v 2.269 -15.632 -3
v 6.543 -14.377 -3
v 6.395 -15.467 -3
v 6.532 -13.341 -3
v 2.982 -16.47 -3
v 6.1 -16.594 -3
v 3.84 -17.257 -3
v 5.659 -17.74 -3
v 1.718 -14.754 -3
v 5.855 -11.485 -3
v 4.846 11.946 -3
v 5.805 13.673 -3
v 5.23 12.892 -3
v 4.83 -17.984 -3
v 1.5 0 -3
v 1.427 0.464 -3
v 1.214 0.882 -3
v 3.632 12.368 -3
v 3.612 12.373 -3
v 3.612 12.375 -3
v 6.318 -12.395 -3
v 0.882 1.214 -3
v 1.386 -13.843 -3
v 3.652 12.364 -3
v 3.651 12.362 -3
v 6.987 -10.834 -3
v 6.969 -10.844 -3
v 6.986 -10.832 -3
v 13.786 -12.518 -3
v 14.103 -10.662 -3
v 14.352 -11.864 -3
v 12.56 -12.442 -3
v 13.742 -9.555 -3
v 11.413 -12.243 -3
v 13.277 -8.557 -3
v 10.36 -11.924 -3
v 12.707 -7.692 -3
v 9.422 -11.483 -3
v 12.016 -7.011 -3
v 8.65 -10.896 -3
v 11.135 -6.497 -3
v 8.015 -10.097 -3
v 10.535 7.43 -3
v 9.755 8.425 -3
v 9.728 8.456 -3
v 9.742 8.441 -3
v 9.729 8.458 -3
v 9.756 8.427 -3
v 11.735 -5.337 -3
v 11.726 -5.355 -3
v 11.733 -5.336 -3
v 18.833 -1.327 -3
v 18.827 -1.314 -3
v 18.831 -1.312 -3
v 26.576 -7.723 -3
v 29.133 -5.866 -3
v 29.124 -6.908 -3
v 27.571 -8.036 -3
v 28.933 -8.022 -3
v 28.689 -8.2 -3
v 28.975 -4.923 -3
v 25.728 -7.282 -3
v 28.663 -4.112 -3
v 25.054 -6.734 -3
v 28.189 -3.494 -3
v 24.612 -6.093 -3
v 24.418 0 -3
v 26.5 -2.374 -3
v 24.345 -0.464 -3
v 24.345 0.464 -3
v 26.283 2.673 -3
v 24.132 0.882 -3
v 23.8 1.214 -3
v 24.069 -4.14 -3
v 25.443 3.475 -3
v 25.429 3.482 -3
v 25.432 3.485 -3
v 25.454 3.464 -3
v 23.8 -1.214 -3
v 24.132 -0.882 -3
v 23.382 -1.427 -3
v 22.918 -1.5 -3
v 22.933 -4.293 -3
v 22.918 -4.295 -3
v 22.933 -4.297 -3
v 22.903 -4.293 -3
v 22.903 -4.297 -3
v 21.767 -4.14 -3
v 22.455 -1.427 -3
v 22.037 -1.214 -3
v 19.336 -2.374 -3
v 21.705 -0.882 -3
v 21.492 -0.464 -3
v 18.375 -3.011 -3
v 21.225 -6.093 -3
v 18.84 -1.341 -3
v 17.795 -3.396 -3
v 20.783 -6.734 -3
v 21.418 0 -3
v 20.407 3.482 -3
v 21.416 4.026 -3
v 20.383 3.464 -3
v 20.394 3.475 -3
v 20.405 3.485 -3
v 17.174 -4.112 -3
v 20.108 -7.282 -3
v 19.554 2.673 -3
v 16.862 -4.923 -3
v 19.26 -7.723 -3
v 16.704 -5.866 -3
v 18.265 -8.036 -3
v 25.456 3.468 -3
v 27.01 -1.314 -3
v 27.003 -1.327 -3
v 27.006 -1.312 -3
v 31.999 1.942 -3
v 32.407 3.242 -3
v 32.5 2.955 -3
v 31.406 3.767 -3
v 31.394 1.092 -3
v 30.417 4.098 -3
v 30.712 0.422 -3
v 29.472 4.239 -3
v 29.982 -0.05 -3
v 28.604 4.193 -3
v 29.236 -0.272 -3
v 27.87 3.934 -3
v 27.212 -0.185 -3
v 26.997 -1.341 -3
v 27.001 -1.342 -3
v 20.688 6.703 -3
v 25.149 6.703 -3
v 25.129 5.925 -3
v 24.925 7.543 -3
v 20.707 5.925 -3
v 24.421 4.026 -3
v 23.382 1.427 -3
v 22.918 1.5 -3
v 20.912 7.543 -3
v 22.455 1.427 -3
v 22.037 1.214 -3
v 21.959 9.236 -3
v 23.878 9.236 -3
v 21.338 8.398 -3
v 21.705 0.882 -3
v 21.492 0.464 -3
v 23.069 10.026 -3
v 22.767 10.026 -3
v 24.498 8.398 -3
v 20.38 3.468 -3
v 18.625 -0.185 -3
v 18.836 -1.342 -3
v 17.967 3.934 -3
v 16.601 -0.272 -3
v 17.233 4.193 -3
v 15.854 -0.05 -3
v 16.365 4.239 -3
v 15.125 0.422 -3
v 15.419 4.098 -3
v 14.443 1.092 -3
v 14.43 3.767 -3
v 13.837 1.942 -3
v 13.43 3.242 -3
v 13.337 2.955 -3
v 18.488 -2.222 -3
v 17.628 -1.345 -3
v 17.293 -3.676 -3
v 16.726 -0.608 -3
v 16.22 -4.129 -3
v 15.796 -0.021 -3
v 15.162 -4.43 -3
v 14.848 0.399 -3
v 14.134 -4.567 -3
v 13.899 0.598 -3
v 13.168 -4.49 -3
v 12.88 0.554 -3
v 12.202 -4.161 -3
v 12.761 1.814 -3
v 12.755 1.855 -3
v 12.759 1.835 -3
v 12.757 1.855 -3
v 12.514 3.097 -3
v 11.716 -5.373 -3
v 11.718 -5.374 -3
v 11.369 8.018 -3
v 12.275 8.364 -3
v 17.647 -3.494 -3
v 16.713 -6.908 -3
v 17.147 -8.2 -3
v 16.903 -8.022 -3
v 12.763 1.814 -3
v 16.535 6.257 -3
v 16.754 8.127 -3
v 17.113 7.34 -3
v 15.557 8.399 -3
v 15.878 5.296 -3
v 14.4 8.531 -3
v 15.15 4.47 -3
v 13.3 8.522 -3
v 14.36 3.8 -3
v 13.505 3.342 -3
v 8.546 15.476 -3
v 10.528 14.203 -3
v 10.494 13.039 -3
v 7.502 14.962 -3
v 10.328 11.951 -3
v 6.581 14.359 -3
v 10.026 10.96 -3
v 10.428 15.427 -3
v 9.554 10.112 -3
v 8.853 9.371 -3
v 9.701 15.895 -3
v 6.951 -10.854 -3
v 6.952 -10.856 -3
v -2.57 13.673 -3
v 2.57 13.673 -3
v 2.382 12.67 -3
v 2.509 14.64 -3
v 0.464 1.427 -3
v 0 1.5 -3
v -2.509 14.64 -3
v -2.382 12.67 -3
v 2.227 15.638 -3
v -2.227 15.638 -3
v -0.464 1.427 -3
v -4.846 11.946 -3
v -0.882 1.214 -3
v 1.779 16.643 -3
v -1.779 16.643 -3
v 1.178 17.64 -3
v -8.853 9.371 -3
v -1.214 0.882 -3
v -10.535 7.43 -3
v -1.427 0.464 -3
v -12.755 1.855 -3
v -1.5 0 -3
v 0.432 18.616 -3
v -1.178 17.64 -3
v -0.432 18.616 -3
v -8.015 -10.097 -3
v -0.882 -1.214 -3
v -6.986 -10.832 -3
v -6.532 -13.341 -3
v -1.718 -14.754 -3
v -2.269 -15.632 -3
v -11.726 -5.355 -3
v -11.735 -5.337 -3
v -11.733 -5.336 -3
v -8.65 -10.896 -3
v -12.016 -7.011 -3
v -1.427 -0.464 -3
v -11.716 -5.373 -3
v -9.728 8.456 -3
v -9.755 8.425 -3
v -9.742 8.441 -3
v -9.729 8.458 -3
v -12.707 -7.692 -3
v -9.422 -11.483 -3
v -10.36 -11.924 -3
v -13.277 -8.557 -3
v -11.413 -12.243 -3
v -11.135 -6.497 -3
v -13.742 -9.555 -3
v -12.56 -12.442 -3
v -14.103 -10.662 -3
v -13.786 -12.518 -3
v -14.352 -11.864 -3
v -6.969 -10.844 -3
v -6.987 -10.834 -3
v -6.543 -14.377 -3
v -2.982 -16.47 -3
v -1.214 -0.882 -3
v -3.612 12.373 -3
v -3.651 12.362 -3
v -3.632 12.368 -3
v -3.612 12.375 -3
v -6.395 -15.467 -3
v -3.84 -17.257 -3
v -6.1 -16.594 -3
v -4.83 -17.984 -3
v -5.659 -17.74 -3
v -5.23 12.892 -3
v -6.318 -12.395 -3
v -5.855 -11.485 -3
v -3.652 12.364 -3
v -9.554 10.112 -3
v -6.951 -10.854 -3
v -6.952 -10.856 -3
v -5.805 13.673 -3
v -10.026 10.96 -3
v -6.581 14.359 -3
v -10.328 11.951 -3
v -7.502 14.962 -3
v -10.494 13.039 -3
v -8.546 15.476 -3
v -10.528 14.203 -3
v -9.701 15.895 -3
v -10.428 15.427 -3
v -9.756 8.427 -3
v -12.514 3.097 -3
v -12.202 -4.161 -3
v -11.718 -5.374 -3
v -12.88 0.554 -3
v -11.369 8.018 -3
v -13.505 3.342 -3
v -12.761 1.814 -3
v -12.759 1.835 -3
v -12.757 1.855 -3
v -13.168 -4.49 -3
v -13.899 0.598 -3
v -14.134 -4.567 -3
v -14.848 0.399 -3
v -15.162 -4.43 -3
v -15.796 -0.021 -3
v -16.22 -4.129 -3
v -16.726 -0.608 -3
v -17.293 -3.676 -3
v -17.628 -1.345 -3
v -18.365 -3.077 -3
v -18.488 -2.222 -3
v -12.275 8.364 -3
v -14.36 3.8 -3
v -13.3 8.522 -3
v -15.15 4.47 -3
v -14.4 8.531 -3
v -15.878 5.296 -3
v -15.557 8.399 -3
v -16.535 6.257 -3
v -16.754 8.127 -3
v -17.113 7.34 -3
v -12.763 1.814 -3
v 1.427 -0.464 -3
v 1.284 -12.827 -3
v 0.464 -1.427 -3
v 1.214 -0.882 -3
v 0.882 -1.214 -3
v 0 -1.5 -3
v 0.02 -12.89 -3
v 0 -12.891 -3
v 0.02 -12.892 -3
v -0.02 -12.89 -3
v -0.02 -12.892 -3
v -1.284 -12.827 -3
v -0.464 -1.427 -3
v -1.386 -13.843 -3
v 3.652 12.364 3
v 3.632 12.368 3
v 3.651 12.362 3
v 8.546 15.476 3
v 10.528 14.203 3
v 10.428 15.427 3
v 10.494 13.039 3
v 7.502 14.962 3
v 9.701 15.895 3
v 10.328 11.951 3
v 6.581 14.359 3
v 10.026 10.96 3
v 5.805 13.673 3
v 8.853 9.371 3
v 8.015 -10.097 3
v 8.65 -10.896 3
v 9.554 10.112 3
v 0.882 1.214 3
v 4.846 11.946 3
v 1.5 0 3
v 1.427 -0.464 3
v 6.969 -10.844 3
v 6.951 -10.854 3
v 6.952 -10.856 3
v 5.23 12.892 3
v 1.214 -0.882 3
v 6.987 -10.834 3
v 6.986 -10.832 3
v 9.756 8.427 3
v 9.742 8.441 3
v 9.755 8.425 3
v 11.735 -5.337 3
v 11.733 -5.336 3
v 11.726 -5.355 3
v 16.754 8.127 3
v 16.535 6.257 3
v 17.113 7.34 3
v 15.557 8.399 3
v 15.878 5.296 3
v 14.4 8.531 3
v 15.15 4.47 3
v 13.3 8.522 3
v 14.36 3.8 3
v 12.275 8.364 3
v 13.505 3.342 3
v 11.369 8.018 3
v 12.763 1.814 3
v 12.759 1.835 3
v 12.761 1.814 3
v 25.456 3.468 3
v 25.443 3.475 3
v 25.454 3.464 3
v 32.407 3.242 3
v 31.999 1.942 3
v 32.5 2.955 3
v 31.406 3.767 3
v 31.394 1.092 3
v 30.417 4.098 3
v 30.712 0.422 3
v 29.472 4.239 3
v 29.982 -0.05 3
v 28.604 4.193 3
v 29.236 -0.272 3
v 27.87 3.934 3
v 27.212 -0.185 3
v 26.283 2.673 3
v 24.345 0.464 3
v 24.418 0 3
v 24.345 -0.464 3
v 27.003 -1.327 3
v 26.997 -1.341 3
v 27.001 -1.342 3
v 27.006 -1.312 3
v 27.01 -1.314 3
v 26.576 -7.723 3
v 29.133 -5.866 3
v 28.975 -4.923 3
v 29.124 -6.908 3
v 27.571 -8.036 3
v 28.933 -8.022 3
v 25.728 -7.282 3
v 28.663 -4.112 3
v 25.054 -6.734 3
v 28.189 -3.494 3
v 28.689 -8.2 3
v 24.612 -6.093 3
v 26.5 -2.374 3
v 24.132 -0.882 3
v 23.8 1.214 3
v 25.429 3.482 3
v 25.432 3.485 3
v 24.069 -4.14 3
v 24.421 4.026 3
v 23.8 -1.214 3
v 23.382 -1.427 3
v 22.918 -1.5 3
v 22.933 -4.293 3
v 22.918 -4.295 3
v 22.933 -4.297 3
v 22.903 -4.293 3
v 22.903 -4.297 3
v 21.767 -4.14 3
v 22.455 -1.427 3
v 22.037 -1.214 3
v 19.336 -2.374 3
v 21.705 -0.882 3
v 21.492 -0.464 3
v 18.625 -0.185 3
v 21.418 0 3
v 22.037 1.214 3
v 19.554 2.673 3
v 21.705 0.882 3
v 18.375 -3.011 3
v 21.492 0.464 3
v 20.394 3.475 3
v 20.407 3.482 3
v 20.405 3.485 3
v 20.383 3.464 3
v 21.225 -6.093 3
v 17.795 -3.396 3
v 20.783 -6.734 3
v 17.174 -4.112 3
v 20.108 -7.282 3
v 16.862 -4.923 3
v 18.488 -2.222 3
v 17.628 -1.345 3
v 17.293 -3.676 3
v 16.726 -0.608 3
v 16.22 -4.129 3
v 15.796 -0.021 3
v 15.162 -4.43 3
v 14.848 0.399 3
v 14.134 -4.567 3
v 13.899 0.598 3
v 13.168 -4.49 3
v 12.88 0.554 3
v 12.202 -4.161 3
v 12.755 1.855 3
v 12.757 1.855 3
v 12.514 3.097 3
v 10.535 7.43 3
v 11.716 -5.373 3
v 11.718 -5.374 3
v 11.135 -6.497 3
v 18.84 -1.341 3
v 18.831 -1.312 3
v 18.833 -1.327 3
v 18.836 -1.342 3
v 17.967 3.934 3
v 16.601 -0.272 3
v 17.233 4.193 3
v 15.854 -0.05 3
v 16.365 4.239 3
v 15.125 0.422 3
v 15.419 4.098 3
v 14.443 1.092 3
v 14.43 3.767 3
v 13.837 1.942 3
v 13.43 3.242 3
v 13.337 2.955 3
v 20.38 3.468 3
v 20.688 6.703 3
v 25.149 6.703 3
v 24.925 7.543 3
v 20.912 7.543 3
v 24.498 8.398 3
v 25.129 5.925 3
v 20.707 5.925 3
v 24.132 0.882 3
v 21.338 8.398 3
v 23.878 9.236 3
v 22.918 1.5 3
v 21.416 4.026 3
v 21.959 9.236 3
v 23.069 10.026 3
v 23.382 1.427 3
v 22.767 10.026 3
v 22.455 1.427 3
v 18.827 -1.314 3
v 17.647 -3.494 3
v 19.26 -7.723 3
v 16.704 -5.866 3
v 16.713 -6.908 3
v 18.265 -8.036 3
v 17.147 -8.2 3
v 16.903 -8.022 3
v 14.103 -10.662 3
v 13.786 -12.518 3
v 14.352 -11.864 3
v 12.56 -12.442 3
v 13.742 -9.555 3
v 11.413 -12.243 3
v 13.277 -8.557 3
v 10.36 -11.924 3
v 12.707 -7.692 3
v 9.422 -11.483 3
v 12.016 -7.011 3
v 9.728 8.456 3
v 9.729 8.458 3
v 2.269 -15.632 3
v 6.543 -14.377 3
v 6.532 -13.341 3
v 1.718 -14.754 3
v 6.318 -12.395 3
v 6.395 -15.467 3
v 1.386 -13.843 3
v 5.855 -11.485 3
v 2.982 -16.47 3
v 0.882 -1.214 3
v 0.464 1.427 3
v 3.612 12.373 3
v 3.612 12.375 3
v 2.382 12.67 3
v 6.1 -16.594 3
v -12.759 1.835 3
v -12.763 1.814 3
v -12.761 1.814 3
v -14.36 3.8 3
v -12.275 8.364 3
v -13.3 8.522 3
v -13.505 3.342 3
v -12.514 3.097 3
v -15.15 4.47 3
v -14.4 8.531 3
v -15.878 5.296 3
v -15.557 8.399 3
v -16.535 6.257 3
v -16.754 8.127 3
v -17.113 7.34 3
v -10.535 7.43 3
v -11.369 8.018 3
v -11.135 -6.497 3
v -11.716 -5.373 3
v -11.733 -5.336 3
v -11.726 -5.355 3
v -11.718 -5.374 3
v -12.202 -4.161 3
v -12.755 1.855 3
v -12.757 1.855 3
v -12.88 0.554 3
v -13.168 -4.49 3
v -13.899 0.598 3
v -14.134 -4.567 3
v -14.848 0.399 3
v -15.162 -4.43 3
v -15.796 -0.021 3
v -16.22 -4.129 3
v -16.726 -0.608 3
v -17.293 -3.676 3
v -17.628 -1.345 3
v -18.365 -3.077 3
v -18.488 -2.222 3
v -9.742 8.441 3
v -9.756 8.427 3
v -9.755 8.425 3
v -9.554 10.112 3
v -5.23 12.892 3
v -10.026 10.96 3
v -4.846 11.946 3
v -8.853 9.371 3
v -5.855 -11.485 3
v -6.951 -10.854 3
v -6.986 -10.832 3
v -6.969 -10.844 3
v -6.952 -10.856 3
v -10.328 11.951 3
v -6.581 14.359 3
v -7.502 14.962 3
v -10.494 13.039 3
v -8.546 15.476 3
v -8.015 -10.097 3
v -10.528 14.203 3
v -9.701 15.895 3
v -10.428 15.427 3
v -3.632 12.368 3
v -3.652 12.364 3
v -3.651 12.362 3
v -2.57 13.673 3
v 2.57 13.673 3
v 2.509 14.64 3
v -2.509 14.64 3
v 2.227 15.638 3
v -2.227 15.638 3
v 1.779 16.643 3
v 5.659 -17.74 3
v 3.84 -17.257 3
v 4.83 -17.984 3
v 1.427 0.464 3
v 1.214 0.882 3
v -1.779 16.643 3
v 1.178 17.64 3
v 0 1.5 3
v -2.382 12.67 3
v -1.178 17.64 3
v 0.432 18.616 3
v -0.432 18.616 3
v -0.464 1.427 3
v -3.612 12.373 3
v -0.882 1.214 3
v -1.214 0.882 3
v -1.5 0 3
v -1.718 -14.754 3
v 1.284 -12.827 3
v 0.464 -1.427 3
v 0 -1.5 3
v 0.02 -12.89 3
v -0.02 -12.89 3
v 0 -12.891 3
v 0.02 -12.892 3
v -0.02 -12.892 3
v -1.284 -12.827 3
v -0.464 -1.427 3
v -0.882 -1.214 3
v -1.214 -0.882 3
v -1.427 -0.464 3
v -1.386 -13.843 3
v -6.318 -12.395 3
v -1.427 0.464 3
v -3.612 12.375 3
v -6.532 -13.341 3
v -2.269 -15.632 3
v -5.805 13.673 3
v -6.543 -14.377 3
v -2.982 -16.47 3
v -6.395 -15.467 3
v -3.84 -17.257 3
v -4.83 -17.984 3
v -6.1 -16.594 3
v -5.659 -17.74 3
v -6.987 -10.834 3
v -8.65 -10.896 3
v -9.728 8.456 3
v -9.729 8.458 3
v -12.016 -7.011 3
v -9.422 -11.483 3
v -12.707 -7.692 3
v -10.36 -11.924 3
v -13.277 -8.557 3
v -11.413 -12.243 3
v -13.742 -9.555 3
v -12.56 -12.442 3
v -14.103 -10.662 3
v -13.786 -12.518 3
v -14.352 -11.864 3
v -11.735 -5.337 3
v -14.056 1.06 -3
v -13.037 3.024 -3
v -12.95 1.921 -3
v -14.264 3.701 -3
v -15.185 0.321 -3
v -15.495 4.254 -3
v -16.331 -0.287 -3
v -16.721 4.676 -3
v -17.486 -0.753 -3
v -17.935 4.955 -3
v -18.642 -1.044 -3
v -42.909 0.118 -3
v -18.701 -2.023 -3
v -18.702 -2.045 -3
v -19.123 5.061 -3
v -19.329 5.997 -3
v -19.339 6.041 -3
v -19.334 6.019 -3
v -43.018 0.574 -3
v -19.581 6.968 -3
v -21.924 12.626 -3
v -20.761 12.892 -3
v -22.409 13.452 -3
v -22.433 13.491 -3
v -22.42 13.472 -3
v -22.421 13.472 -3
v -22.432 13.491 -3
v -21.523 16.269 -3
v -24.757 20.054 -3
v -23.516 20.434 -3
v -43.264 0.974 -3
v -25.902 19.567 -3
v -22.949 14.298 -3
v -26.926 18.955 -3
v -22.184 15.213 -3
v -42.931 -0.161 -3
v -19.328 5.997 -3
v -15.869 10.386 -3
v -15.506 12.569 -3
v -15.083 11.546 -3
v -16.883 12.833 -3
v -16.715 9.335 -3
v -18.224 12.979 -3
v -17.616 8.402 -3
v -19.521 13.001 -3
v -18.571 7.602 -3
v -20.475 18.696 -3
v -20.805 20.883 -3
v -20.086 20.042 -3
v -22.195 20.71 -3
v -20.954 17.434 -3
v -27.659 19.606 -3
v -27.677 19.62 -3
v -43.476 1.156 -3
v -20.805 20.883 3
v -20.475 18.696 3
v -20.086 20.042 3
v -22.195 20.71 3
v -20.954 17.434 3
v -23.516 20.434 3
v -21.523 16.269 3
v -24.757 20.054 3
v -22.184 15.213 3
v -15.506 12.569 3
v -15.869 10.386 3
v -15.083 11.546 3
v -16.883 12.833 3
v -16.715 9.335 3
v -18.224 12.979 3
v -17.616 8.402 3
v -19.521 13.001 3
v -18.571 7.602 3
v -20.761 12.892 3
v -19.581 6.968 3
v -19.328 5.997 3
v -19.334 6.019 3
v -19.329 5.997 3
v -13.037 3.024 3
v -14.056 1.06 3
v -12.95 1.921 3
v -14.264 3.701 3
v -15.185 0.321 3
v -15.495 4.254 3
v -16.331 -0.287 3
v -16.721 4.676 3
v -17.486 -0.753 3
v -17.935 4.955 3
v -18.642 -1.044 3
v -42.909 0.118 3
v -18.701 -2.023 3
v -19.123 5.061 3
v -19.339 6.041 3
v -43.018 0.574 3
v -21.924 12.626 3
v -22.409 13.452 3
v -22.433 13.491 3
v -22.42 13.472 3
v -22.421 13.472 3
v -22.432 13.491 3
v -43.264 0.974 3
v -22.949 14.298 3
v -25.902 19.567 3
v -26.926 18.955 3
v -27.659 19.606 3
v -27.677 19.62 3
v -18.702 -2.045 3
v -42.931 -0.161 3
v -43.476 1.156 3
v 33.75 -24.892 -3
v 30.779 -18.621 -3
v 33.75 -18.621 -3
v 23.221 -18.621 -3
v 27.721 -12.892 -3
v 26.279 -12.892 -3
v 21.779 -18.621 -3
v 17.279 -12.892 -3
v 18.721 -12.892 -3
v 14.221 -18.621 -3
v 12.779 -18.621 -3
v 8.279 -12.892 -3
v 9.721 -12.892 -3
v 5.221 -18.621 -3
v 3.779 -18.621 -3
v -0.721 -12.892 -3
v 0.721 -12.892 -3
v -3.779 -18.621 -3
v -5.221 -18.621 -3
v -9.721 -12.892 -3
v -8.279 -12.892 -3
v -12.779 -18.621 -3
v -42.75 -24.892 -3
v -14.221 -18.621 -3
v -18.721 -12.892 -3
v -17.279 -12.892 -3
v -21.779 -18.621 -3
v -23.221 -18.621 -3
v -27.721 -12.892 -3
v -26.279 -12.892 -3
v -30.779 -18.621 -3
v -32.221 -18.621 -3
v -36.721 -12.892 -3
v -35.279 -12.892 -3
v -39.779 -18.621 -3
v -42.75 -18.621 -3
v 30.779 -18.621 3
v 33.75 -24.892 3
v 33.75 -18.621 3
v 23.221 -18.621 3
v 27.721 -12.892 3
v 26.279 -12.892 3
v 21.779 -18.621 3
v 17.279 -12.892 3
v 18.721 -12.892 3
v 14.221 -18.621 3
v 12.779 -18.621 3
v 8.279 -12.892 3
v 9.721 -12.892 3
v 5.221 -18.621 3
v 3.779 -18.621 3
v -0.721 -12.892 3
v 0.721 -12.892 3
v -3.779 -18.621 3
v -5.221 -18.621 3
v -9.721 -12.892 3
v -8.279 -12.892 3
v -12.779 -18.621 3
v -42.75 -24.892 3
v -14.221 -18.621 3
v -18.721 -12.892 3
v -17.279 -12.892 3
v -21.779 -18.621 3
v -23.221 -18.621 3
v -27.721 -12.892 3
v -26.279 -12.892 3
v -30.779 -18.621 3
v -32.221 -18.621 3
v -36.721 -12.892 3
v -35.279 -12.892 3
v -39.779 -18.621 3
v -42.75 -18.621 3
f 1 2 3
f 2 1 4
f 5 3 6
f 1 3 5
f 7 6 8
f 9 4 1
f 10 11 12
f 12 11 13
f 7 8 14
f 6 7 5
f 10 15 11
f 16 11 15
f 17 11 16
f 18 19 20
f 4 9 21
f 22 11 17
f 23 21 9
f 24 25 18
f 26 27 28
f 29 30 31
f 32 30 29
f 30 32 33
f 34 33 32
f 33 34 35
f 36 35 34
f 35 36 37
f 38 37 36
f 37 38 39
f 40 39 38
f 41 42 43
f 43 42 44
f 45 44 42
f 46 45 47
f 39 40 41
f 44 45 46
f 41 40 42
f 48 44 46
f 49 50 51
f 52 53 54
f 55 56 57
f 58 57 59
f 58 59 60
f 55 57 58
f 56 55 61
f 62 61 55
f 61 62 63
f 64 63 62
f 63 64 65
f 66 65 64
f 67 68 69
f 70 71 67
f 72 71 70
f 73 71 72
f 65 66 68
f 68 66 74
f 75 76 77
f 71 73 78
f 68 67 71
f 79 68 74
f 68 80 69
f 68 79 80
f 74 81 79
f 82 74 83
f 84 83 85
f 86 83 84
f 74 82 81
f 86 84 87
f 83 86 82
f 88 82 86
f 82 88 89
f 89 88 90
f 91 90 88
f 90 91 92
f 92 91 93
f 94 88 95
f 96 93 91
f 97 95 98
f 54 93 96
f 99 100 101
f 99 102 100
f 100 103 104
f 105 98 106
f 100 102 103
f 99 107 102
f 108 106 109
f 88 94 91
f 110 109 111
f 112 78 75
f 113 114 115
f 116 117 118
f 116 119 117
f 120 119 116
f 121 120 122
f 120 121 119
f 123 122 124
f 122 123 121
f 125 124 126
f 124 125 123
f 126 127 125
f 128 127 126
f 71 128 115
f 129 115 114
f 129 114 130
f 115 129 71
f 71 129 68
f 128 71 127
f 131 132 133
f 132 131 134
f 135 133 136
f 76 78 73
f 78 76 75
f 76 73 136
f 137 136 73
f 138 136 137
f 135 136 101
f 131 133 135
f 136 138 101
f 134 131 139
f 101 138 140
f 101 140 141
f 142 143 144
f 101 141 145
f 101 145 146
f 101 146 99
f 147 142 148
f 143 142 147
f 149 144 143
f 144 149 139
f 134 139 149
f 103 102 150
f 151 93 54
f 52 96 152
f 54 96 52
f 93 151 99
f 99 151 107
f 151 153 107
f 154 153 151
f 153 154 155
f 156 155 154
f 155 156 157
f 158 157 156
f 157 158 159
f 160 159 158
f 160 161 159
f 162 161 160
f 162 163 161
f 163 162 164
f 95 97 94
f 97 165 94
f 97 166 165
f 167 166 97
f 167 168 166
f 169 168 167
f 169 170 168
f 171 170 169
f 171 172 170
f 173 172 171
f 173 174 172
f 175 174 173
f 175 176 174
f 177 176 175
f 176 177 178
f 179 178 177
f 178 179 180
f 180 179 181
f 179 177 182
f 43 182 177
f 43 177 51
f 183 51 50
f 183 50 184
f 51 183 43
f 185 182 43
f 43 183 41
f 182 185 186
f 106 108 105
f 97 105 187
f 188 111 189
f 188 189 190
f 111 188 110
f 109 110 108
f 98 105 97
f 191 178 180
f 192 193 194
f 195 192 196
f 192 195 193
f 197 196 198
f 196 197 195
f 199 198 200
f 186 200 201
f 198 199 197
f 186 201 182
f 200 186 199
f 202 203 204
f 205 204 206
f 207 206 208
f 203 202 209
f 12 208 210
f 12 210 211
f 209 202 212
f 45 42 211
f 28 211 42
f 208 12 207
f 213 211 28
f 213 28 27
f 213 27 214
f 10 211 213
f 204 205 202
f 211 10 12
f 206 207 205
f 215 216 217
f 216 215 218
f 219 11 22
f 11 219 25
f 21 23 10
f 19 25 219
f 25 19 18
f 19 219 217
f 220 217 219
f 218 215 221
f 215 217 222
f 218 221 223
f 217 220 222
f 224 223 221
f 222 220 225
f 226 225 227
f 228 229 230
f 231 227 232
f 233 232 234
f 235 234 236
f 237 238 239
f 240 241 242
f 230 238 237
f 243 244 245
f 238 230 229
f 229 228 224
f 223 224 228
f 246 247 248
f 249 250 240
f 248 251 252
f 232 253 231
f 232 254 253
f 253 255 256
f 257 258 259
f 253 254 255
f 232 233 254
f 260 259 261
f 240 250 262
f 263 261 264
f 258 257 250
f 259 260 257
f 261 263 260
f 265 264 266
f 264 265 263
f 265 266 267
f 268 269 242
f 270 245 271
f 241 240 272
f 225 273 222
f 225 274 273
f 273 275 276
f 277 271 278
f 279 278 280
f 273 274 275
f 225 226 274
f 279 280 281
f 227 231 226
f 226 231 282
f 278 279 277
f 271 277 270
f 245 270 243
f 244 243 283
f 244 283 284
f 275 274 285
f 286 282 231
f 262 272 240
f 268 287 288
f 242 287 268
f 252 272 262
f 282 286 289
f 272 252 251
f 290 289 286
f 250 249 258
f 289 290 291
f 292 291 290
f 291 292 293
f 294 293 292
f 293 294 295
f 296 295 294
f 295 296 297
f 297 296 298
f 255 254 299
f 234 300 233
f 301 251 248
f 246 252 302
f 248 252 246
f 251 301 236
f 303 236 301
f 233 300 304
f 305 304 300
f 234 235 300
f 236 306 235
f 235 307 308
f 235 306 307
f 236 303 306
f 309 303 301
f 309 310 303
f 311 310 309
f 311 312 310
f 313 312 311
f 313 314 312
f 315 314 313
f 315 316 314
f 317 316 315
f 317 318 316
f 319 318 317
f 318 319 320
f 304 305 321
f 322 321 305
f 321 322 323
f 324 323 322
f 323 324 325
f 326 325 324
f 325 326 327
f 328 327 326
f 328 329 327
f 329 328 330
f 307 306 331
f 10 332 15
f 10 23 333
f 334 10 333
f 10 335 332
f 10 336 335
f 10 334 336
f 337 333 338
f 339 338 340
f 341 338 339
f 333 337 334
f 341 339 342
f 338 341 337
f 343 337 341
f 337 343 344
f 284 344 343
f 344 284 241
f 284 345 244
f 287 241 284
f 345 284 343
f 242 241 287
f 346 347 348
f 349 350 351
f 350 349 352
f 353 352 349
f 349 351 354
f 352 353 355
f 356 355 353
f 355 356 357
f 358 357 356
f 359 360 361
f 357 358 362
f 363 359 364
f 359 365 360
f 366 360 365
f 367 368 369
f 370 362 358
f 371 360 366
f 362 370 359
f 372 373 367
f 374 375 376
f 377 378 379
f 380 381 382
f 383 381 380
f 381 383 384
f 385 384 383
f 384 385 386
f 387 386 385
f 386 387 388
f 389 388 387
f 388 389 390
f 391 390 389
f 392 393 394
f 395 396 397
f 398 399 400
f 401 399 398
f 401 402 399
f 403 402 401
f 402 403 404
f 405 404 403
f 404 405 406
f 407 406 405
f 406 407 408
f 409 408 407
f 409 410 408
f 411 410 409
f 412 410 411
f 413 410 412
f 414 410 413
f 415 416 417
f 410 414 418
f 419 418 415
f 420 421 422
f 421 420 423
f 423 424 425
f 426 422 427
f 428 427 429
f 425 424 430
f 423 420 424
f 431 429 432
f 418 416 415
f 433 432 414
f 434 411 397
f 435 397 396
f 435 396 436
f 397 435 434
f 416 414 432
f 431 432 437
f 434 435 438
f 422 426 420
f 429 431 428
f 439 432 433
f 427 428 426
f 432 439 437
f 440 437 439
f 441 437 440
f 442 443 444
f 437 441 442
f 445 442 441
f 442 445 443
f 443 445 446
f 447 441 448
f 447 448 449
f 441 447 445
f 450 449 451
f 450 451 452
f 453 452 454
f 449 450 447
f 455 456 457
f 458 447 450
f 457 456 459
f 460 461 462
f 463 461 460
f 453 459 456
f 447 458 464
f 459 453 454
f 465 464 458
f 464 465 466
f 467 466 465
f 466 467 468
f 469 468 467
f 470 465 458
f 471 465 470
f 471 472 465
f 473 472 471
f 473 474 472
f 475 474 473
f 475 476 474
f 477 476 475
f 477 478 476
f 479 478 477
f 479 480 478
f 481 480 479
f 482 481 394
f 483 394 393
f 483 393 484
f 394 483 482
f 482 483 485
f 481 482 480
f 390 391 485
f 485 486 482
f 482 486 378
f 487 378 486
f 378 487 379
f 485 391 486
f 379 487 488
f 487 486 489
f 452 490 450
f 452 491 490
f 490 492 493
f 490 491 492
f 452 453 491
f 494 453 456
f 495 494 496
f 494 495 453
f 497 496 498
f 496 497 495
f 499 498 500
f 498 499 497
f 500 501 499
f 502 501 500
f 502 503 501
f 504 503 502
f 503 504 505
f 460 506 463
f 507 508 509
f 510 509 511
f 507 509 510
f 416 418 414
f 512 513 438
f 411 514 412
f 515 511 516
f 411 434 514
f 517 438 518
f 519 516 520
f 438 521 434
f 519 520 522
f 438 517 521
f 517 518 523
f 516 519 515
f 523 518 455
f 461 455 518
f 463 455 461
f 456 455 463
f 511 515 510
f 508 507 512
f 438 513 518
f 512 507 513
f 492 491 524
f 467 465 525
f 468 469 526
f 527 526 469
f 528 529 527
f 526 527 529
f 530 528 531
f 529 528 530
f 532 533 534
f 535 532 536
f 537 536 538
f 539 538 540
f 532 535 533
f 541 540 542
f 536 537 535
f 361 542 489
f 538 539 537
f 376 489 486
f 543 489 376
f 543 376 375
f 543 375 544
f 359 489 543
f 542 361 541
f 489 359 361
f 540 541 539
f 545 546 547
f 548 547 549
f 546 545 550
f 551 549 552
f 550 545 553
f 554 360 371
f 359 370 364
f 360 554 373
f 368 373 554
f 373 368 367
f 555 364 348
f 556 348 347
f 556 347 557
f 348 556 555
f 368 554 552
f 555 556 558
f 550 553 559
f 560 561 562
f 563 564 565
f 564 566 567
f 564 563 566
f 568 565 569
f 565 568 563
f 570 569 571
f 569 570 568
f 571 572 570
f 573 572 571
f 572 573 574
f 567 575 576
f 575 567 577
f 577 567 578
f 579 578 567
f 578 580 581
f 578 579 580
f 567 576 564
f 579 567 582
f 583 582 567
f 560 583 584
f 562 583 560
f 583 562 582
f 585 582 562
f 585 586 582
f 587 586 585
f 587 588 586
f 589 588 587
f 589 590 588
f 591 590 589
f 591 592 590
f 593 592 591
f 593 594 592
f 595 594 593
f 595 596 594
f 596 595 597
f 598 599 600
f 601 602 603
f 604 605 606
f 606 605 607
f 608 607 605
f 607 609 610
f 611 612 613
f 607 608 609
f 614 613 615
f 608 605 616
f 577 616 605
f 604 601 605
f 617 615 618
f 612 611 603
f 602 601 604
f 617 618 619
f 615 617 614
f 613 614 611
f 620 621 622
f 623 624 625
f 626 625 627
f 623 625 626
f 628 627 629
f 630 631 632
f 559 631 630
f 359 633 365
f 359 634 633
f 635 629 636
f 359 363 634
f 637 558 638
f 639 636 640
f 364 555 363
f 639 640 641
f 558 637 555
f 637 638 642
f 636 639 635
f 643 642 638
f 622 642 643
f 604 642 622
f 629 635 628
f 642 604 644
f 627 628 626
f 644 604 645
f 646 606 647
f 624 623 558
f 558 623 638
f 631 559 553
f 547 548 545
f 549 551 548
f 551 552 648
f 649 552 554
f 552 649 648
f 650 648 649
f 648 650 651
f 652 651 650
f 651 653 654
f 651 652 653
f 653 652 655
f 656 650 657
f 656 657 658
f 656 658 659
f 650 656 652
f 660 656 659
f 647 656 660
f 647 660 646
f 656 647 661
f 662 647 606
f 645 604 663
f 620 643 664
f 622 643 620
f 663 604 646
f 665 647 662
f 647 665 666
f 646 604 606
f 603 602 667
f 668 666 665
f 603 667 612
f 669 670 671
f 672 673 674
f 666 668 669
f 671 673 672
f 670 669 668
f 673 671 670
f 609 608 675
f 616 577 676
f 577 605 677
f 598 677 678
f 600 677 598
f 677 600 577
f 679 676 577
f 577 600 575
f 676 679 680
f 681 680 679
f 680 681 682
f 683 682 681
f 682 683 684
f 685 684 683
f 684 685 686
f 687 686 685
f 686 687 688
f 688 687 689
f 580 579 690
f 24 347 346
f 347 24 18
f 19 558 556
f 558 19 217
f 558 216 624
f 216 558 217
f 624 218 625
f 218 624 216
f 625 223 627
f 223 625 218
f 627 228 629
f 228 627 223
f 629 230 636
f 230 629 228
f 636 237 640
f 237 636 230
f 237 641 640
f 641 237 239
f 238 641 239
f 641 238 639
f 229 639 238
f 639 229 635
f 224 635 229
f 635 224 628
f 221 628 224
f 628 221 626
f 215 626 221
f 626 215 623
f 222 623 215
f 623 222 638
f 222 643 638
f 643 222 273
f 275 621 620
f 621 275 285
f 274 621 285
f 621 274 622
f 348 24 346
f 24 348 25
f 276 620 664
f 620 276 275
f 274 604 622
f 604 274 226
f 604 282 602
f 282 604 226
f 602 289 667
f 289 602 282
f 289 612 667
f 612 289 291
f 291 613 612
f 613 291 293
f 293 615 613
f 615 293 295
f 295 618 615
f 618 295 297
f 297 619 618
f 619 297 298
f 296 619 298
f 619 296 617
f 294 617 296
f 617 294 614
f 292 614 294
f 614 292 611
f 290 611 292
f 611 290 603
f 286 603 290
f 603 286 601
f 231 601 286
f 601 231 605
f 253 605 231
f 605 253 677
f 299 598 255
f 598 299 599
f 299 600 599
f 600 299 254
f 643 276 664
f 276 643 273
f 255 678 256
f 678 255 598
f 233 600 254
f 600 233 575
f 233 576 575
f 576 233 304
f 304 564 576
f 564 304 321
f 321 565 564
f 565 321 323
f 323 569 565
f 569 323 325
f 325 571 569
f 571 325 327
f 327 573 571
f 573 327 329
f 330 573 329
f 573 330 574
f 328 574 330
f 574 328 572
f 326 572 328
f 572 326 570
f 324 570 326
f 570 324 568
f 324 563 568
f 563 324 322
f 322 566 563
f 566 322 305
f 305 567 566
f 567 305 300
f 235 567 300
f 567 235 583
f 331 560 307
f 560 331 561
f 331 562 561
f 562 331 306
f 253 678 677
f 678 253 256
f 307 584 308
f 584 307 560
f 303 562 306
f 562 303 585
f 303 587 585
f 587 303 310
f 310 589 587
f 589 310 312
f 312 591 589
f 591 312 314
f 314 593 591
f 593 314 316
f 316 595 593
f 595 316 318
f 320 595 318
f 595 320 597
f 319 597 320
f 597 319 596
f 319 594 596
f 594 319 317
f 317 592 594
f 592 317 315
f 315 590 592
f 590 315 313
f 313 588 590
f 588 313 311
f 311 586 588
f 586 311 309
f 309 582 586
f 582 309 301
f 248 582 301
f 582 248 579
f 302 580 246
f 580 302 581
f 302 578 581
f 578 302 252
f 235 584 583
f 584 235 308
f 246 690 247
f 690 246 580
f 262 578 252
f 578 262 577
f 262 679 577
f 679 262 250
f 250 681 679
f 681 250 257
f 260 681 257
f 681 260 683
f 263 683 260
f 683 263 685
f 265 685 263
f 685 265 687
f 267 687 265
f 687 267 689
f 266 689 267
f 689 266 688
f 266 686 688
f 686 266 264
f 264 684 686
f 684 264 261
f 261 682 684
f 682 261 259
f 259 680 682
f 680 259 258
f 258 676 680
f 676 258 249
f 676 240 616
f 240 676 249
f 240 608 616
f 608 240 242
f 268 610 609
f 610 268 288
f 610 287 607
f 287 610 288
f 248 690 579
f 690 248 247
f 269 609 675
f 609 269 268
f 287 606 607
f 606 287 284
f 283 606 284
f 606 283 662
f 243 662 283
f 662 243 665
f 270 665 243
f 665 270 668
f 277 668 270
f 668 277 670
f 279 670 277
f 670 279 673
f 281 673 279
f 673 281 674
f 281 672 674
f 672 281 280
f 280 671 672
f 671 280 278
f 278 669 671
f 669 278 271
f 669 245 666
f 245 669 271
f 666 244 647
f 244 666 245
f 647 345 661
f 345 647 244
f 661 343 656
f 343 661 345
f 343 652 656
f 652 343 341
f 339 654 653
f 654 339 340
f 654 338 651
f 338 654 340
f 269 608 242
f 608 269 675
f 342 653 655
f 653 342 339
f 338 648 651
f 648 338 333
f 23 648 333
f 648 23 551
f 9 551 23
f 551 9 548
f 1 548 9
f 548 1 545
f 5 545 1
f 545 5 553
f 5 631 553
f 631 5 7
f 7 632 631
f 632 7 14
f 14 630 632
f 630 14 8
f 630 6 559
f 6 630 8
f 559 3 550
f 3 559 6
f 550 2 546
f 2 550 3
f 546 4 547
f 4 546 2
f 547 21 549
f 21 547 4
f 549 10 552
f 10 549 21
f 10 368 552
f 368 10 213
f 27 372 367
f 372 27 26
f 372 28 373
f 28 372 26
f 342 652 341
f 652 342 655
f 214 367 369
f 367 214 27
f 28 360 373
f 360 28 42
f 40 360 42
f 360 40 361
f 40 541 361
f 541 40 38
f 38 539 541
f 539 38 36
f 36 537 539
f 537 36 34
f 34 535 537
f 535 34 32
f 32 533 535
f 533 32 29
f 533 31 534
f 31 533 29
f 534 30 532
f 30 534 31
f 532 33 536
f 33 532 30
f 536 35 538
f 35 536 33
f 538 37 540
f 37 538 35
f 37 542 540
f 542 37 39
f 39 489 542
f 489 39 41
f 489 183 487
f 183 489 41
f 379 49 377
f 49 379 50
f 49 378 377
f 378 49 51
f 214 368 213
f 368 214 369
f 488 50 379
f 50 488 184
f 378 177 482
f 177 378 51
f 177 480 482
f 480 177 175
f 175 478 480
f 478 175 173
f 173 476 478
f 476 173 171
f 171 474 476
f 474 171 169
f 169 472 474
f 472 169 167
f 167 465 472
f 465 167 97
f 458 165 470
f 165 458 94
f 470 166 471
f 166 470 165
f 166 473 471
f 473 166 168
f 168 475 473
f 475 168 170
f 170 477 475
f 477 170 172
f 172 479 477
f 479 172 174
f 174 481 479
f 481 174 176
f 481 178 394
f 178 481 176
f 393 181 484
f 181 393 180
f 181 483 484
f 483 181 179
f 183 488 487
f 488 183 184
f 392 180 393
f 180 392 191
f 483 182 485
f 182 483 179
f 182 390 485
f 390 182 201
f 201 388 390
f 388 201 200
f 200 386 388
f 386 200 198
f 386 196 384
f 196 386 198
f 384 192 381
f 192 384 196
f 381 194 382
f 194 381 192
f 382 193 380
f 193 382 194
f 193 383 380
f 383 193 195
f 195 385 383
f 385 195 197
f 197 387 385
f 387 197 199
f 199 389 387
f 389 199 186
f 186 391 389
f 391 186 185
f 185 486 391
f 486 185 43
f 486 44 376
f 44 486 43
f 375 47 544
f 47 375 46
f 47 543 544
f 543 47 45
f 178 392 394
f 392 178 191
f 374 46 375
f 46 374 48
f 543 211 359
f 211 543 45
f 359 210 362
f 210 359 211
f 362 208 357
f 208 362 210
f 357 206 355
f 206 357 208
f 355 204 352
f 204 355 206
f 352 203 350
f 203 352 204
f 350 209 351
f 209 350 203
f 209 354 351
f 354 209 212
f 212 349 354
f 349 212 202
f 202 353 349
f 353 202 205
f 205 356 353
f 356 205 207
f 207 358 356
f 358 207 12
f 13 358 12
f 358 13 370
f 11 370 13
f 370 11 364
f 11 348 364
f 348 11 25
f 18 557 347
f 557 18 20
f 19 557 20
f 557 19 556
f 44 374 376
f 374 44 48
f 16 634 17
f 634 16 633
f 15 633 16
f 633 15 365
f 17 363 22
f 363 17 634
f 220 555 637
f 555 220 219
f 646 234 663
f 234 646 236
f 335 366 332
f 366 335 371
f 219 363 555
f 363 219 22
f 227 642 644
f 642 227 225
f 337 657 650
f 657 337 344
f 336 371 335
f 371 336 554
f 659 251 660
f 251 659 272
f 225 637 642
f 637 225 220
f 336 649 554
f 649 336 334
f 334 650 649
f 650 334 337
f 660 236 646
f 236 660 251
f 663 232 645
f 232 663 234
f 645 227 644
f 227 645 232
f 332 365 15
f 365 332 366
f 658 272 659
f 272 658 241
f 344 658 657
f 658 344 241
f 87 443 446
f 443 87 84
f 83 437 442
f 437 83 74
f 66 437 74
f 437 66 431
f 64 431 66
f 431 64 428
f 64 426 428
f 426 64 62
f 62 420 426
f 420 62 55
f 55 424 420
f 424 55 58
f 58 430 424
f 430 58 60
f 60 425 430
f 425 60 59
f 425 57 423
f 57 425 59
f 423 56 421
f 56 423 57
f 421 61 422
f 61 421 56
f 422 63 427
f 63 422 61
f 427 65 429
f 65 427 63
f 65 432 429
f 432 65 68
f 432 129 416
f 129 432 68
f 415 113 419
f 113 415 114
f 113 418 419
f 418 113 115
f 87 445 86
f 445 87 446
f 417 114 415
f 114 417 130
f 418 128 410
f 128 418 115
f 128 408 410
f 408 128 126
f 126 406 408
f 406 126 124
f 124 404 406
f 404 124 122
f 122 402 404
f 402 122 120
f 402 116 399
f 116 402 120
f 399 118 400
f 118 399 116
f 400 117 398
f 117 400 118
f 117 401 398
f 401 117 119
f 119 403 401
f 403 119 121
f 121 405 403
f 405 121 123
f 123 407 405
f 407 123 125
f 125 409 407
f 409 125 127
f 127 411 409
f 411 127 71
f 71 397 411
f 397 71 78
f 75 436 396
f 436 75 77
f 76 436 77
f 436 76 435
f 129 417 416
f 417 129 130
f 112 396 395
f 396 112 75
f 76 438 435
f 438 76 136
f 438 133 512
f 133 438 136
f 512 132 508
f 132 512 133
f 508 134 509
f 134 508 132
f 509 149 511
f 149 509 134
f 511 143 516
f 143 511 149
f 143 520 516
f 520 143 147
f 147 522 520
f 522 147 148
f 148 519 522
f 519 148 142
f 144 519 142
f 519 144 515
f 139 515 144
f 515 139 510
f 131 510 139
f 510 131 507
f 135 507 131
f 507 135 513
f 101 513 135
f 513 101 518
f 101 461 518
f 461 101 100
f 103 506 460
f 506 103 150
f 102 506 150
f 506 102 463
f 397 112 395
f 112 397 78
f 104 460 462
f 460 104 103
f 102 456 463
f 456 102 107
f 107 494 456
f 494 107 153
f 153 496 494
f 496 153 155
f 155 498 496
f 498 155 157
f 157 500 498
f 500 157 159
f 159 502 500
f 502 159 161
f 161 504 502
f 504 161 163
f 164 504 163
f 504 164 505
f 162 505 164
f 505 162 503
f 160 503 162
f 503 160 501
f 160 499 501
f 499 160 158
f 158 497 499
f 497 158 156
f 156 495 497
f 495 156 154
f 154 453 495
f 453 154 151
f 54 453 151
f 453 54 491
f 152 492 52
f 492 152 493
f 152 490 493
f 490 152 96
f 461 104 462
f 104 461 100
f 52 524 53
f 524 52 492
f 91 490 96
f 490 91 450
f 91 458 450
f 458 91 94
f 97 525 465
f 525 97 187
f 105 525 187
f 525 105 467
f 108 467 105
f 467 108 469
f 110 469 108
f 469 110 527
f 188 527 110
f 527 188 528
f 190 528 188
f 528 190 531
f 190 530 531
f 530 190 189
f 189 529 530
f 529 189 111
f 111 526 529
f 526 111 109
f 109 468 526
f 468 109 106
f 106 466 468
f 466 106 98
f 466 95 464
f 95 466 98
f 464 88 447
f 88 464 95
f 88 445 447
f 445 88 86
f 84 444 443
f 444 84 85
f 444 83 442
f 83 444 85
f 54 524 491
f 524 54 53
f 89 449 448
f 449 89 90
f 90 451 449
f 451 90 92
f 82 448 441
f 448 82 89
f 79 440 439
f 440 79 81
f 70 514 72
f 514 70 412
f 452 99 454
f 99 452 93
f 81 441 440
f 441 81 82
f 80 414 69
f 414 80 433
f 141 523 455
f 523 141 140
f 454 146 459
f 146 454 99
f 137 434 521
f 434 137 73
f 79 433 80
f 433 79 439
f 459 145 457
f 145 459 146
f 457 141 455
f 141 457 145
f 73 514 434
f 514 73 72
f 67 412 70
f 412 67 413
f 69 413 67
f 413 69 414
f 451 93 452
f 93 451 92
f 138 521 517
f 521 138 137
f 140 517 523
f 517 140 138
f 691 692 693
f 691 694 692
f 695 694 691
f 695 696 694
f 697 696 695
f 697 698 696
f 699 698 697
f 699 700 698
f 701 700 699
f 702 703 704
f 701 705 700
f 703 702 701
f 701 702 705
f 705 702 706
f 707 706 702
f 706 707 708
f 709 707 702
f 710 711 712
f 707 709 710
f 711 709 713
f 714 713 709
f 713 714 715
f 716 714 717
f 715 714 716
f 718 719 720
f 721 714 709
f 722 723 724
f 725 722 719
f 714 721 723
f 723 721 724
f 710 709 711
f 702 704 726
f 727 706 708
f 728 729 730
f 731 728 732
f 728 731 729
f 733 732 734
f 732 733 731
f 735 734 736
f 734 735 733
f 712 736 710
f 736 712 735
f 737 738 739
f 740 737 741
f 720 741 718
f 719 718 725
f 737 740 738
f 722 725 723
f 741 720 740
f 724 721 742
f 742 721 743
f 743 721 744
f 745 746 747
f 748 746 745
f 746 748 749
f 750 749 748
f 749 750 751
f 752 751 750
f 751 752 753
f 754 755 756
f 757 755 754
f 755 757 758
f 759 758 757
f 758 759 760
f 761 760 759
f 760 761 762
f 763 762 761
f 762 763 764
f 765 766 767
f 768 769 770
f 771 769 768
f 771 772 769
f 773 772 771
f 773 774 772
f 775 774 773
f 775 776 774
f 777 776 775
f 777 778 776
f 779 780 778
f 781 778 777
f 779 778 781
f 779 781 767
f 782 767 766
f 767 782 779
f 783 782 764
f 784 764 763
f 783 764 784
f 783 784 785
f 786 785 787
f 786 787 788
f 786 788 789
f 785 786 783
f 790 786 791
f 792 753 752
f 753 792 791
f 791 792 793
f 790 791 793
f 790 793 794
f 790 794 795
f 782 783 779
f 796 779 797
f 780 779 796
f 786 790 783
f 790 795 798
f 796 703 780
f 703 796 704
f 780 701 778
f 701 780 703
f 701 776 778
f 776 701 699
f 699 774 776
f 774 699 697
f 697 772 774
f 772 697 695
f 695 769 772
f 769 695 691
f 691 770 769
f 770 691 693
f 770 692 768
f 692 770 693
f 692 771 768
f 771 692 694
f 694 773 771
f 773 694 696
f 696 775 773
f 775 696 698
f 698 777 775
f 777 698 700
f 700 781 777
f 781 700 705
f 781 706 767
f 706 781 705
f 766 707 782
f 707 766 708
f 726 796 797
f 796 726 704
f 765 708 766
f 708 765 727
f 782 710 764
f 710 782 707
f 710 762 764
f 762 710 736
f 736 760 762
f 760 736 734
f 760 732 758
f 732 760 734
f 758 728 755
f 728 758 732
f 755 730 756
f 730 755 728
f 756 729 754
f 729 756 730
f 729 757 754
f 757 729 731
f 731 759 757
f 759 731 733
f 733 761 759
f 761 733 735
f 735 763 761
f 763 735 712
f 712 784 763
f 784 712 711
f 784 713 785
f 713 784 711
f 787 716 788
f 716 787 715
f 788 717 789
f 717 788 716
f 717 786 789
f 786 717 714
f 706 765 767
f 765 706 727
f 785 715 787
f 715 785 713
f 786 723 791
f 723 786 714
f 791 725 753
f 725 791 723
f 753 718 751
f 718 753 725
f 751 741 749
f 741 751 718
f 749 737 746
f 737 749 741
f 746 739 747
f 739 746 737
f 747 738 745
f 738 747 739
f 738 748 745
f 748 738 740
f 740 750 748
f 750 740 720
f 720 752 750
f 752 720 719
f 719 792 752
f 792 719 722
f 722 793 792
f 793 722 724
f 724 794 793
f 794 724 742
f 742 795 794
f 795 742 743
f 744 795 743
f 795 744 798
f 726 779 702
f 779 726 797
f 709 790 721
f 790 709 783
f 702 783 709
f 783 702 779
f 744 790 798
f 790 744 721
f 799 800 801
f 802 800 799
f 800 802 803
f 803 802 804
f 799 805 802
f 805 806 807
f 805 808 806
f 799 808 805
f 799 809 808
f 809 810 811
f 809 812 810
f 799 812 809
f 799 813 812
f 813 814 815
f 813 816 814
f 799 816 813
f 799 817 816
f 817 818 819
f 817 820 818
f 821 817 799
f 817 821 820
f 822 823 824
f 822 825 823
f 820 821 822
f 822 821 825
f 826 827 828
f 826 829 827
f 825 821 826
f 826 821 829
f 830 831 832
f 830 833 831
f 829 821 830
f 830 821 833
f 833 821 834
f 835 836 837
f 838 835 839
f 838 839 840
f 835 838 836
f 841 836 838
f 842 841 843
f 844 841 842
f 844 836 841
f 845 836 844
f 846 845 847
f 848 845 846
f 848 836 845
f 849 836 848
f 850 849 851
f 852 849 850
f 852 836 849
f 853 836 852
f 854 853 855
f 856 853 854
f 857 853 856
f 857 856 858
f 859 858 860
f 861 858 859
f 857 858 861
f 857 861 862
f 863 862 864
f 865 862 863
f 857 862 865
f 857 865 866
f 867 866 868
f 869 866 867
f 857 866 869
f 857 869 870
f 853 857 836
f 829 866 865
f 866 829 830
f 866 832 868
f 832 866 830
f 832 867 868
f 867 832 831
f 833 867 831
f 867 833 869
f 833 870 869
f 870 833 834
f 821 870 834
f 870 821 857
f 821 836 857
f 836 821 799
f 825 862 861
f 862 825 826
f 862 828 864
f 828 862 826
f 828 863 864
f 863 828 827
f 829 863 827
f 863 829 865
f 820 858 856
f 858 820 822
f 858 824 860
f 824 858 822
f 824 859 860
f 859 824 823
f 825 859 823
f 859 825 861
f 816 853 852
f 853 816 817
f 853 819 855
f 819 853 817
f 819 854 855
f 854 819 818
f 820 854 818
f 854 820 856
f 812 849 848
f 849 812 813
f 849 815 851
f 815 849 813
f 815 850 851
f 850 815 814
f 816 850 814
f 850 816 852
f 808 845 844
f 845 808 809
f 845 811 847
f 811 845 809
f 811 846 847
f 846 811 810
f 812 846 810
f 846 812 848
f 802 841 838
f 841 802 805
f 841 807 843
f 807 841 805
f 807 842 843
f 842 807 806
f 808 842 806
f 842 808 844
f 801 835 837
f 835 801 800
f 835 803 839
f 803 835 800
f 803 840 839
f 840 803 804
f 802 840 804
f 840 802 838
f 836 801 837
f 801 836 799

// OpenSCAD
//////////////////////////////////////////////////////////////////////////////////////////////
// Public Domain Parametric Involute Spur Gear (and involute helical gear and involute rack)
// version 1.1
// by Leemon Baird, 2011, Leemon@Leemon.com
//http://www.thingiverse.com/thing:5505
//
// This file is public domain.  Use it for any purpose, including commercial
// applications.  Attribution would be nice, but is not required.  There is
// no warranty of any kind, including its correctness, usefulness, or safety.
// 
// This is parameterized involute spur (or helical) gear.  It is much simpler and less powerful than
// others on Thingiverse.  But it is public domain.  I implemented it from scratch from the 
// descriptions and equations on Wikipedia and the web, using Mathematica for calculations and testing,
// and I now release it into the public domain.
//
//		http://en.wikipedia.org/wiki/Involute_gear
//		http://en.wikipedia.org/wiki/Gear
//		http://en.wikipedia.org/wiki/List_of_gear_nomenclature
//		http://gtrebaol.free.fr/doc/catia/spur_gear.html
//		http://www.cs.cmu.edu/~rapidproto/mechanisms/chpt7.html
//
// The module gear() gives an involute spur gear, with reasonable defaults for all the parameters.
// Normally, you should just choose the first 4 parameters, and let the rest be default values.
// The module gear() gives a gear in the XY plane, centered on the origin, with one tooth centered on
// the positive Y axis.  The various functions below it take the same parameters, and return various
// measurements for the gear.  The most important is pitch_radius, which tells how far apart to space
// gears that are meshing, and adendum_radius, which gives the size of the region filled by the gear.
// A gear has a "pitch circle", which is an invisible circle that cuts through the middle of each
// tooth (though not the exact center). In order for two gears to mesh, their pitch circles should 
// just touch.  So the distance between their centers should be pitch_radius() for one, plus pitch_radius() 
// for the other, which gives the radii of their pitch circles.
//
// In order for two gears to mesh, they must have the same mm_per_tooth and pressure_angle parameters.  
// mm_per_tooth gives the number of millimeters of arc around the pitch circle covered by one tooth and one
// space between teeth.  The pitch angle controls how flat or bulged the sides of the teeth are.  Common
// values include 14.5 degrees and 20 degrees, and occasionally 25.  Though I've seen 28 recommended for
// plastic gears. Larger numbers bulge out more, giving stronger teeth, so 28 degrees is the default here.
//
// The ratio of number_of_teeth for two meshing gears gives how many times one will make a full 
// revolution when the the other makes one full revolution.  If the two numbers are coprime (i.e. 
// are not both divisible by the same number greater than 1), then every tooth on one gear
// will meet every tooth on the other, for more even wear.  So coprime numbers of teeth are good.
//
// The module rack() gives a rack, which is a bar with teeth.  A rack can mesh with any
// gear that has the same mm_per_tooth and pressure_angle.
//
// Some terminology: 
// The outline of a gear is a smooth circle (the "pitch circle") which has mountains and valleys
// added so it is toothed.  So there is an inner circle (the "root circle") that touches the 
// base of all the teeth, an outer circle that touches the tips of all the teeth,
// and the invisible pitch circle in between them.  There is also a "base circle", which can be smaller than
// all three of the others, which controls the shape of the teeth.  The side of each tooth lies on the path 
// that the end of a string would follow if it were wrapped tightly around the base circle, then slowly unwound.  
// That shape is an "involute", which gives this type of gear its name.
//
//////////////////////////////////////////////////////////////////////////////////////////////

//An involute spur gear, with reasonable defaults for all the parameters.
//Normally, you should just choose the first 4 parameters, and let the rest be default values.
//Meshing gears must match in mm_per_tooth, pressure_angle, and twist,
//and be separated by the sum of their pitch radii, which can be found with pitch_radius().
module gear (
	mm_per_tooth    = 3,    //this is the "circular pitch", the circumference of the pitch circle divided by the number of teeth
	number_of_teeth = 11,   //total number of teeth around the entire perimeter
	thickness       = 6,    //thickness of gear in mm
	hole_diameter   = 3,    //diameter of the hole in the center, in mm
	twist           = 0,    //teeth rotate this many degrees from bottom of gear to top.  360 makes the gear a screw with each thread going around once
	teeth_to_hide   = 0,    //number of teeth to delete to make this only a fraction of a circle
	pressure_angle  = 28,   //Controls how straight or bulged the tooth sides are. In degrees.
	clearance       = 0.0,  //gap between top of a tooth on one gear and bottom of valley on a meshing gear (in millimeters)
	backlash        = 0.0   //gap between two meshing teeth, in the direction along the circumference of the pitch circle
) {
	pi = 3.1415926;
	p  = mm_per_tooth * number_of_teeth / pi / 2;  //radius of pitch circle
	c  = p + mm_per_tooth / pi - clearance;       //radius of outer circle
	b  = p*cos(pressure_angle);                    //radius of base circle
	r  = p-(c-p)-clearance;                        //radius of root circle
	t  = mm_per_tooth/2-backlash/2;                //tooth thickness at pitch circle
	k  = -iang(b, p) - t/2/p/pi*180;
    {             //angle to where involute meets base circle on each side of tooth
		difference() {
        echo(number_of_teeth-teeth_to_hide-1);
			for (i = [0:number_of_teeth-teeth_to_hide-1] )
				rotate([0,0,i*360/number_of_teeth])
					linear_extrude(height = thickness, center = true, convexity = 10, twist = twist)
						polygon(
							points=[
								[0, -hole_diameter/10],
								polar(r, -181/number_of_teeth),
								polar(r, r<b ? k : -180/number_of_teeth),
								q7(0/5,r,b,c,k, 1),q7(1/5,r,b,c,k, 1),q7(2/5,r,b,c,k, 1),q7(3/5,r,b,c,k, 1),q7(4/5,r,b,c,k, 1),q7(5/5,r,b,c,k, 1),
								q7(5/5,r,b,c,k,-1),q7(4/5,r,b,c,k,-1),q7(3/5,r,b,c,k,-1),q7(2/5,r,b,c,k,-1),q7(1/5,r,b,c,k,-1),q7(0/5,r,b,c,k,-1),
								polar(r, r<b ? -k : 180/number_of_teeth),
								polar(r, 181/number_of_teeth)
							],
 							paths=[[0,1,2,3,4,5,6,7,8,9,10,11,12,13,14,15,16]]
						);
			cylinder(h=2*thickness+1, r=hole_diameter/2, center=true, $fn=20);
		}
	}
};	
//these 4 functions are used by gear
function polar(r,theta)   = r*[sin(theta), cos(theta)];                            //convert polar to cartesian coordinates
function iang(r1,r2)      = sqrt((r2/r1)*(r2/r1) - 1)/3.1415926*180 - acos(r1/r2); //unwind a string this many degrees to go from radius r1 to radius r2
function q7(f,r,b,r2,t,s) = q6(b,s,t,(1-f)*max(b,r)+f*r2);                         //radius a fraction f up the curved side of the tooth 
function q6(b,s,t,d)      = polar(d,s*(iang(b,d)+t));                              //point at radius d on the involute curve

//a rack, which is a straight line with teeth (the same as a segment from a giant gear with a huge number of teeth).
//The "pitch circle" is a line along the X axis.
module rack (
	mm_per_tooth    = 3,    //this is the "circular pitch", the circumference of the pitch circle divided by the number of teeth
	number_of_teeth = 11,   //total number of teeth along the rack
	thickness       = 6,    //thickness of rack in mm (affects each tooth)
	height          = 120,   //height of rack in mm, from tooth top to far side of rack.
	pressure_angle  = 28,   //Controls how straight or bulged the tooth sides are. In degrees.
	backlash        = 0.0   //gap between two meshing teeth, in the direction along the circumference of the pitch circle
) {
	pi = 3.1415926;
	a = mm_per_tooth / pi; //addendum
	t = a*cos(pressure_angle)-1;         //tooth side is tilted so top/bottom corners move this amount
		for (i = [0:number_of_teeth-1] )
			translate([i*mm_per_tooth,0,0])
				linear_extrude(height = thickness, center = true, convexity = 10)
					polygon(
						points=[
							[-mm_per_tooth * 3/4,                 a-height],
							[-mm_per_tooth * 3/4 - backlash,     -a],
							[-mm_per_tooth * 1/4 + backlash - t, -a],
							[-mm_per_tooth * 1/4 + backlash + t,  a],
							[ mm_per_tooth * 1/4 - backlash - t,  a],
							[ mm_per_tooth * 1/4 - backlash + t, -a],
							[ mm_per_tooth * 3/4 + backlash,     -a],
							[ mm_per_tooth * 3/4,                 a-height],
						],
						paths=[[0,1,2,3,4,5,6,7]]
					);
};	

//These 5 functions let the user find the derived dimensions of the gear.
//A gear fits within a circle of radius outer_radius, and two gears should have
//their centers separated by the sum of their pictch_radius.
function circular_pitch  (mm_per_tooth=3) = mm_per_tooth;                     //tooth density expressed as "circular pitch" in millimeters
function diametral_pitch (mm_per_tooth=3) = 3.1415926 / mm_per_tooth;         //tooth density expressed as "diametral pitch" in teeth per millimeter
function module_value    (mm_per_tooth=3) = mm_per_tooth / pi;                //tooth density expressed as "module" or "modulus" in millimeters
function pitch_radius    (mm_per_tooth=3,number_of_teeth=11) = mm_per_tooth * number_of_teeth / 3.1415926 / 2;
function outer_radius    (mm_per_tooth=3,number_of_teeth=11,clearance=0.1)    //The gear fits entirely within a cylinder of this radius.
	= mm_per_tooth*(1+number_of_teeth/2)/3.1415926  - clearance;              

//////////////////////////////////////////////////////////////////////////////////////////////
//example gear train.  
//Try it with OpenSCAD View/Animate command with 20 steps and 24 FPS.
//The gears will continue to be rotated to mesh correctly if you change the number of teeth.

n1 = 11; //red gear number of teeth
n2 = 20; //green gear
n3 = 5;  //blue gear
n4 = 20; //orange gear
n5 = 8;  //gray rack
mm_per_tooth = 9; //all meshing gears need the same mm_per_tooth (and the same pressure_angle)
thickness    = 6;
hole         = 3;
height       = 12;

d1 =pitch_radius(mm_per_tooth,n1);
d12=pitch_radius(mm_per_tooth,n1) + pitch_radius(mm_per_tooth,n2);
d13=pitch_radius(mm_per_tooth,n1) + pitch_radius(mm_per_tooth,n3);
d14=pitch_radius(mm_per_tooth,n1) + pitch_radius(mm_per_tooth,n4);

translate([ 0,    0, 0]) rotate([0,0, $t*360/n1])                 color([1.00,0.75,0.75]) gear(mm_per_tooth,n1,thickness,hole);
//translate([ 0,  d12, 0]) rotate([0,0,-($t+n2/2-0*n1+1/2)*360/n2]) color([0.75,1.00,0.75]) gear(mm_per_tooth,n2,thickness,hole,0,108);
translate([ d13,  0, 0]) rotate([0,0,-($t-n3/4+n1/4+1/2)*360/n3]) color([0.75,0.75,1.00]) gear(mm_per_tooth,n3,thickness,hole);
translate([ d13,  0, 0]) rotate([0,0,-($t-n3/4+n1/4+1/2)*360/n3]) color([0.75,0.75,1.00]) gear(mm_per_tooth,n3,thickness,hole);
translate([-d14,  0, 0]) rotate([0,0,-($t-n4/4-n1/4+1/2-floor(n4/4)-3)*360/n4]) color([1.00,0.75,0.50]) gear(mm_per_tooth,n4,thickness,hole,0,n4-3);
translate([(-floor(n5/2)-floor(n1/2)+$t+n1/2-1/2)*9, -d1+0.0, 0]) rotate([0,0,0]) color([0.75,0.75,0.75]) rack(mm_per_tooth,n5,thickness,height);
